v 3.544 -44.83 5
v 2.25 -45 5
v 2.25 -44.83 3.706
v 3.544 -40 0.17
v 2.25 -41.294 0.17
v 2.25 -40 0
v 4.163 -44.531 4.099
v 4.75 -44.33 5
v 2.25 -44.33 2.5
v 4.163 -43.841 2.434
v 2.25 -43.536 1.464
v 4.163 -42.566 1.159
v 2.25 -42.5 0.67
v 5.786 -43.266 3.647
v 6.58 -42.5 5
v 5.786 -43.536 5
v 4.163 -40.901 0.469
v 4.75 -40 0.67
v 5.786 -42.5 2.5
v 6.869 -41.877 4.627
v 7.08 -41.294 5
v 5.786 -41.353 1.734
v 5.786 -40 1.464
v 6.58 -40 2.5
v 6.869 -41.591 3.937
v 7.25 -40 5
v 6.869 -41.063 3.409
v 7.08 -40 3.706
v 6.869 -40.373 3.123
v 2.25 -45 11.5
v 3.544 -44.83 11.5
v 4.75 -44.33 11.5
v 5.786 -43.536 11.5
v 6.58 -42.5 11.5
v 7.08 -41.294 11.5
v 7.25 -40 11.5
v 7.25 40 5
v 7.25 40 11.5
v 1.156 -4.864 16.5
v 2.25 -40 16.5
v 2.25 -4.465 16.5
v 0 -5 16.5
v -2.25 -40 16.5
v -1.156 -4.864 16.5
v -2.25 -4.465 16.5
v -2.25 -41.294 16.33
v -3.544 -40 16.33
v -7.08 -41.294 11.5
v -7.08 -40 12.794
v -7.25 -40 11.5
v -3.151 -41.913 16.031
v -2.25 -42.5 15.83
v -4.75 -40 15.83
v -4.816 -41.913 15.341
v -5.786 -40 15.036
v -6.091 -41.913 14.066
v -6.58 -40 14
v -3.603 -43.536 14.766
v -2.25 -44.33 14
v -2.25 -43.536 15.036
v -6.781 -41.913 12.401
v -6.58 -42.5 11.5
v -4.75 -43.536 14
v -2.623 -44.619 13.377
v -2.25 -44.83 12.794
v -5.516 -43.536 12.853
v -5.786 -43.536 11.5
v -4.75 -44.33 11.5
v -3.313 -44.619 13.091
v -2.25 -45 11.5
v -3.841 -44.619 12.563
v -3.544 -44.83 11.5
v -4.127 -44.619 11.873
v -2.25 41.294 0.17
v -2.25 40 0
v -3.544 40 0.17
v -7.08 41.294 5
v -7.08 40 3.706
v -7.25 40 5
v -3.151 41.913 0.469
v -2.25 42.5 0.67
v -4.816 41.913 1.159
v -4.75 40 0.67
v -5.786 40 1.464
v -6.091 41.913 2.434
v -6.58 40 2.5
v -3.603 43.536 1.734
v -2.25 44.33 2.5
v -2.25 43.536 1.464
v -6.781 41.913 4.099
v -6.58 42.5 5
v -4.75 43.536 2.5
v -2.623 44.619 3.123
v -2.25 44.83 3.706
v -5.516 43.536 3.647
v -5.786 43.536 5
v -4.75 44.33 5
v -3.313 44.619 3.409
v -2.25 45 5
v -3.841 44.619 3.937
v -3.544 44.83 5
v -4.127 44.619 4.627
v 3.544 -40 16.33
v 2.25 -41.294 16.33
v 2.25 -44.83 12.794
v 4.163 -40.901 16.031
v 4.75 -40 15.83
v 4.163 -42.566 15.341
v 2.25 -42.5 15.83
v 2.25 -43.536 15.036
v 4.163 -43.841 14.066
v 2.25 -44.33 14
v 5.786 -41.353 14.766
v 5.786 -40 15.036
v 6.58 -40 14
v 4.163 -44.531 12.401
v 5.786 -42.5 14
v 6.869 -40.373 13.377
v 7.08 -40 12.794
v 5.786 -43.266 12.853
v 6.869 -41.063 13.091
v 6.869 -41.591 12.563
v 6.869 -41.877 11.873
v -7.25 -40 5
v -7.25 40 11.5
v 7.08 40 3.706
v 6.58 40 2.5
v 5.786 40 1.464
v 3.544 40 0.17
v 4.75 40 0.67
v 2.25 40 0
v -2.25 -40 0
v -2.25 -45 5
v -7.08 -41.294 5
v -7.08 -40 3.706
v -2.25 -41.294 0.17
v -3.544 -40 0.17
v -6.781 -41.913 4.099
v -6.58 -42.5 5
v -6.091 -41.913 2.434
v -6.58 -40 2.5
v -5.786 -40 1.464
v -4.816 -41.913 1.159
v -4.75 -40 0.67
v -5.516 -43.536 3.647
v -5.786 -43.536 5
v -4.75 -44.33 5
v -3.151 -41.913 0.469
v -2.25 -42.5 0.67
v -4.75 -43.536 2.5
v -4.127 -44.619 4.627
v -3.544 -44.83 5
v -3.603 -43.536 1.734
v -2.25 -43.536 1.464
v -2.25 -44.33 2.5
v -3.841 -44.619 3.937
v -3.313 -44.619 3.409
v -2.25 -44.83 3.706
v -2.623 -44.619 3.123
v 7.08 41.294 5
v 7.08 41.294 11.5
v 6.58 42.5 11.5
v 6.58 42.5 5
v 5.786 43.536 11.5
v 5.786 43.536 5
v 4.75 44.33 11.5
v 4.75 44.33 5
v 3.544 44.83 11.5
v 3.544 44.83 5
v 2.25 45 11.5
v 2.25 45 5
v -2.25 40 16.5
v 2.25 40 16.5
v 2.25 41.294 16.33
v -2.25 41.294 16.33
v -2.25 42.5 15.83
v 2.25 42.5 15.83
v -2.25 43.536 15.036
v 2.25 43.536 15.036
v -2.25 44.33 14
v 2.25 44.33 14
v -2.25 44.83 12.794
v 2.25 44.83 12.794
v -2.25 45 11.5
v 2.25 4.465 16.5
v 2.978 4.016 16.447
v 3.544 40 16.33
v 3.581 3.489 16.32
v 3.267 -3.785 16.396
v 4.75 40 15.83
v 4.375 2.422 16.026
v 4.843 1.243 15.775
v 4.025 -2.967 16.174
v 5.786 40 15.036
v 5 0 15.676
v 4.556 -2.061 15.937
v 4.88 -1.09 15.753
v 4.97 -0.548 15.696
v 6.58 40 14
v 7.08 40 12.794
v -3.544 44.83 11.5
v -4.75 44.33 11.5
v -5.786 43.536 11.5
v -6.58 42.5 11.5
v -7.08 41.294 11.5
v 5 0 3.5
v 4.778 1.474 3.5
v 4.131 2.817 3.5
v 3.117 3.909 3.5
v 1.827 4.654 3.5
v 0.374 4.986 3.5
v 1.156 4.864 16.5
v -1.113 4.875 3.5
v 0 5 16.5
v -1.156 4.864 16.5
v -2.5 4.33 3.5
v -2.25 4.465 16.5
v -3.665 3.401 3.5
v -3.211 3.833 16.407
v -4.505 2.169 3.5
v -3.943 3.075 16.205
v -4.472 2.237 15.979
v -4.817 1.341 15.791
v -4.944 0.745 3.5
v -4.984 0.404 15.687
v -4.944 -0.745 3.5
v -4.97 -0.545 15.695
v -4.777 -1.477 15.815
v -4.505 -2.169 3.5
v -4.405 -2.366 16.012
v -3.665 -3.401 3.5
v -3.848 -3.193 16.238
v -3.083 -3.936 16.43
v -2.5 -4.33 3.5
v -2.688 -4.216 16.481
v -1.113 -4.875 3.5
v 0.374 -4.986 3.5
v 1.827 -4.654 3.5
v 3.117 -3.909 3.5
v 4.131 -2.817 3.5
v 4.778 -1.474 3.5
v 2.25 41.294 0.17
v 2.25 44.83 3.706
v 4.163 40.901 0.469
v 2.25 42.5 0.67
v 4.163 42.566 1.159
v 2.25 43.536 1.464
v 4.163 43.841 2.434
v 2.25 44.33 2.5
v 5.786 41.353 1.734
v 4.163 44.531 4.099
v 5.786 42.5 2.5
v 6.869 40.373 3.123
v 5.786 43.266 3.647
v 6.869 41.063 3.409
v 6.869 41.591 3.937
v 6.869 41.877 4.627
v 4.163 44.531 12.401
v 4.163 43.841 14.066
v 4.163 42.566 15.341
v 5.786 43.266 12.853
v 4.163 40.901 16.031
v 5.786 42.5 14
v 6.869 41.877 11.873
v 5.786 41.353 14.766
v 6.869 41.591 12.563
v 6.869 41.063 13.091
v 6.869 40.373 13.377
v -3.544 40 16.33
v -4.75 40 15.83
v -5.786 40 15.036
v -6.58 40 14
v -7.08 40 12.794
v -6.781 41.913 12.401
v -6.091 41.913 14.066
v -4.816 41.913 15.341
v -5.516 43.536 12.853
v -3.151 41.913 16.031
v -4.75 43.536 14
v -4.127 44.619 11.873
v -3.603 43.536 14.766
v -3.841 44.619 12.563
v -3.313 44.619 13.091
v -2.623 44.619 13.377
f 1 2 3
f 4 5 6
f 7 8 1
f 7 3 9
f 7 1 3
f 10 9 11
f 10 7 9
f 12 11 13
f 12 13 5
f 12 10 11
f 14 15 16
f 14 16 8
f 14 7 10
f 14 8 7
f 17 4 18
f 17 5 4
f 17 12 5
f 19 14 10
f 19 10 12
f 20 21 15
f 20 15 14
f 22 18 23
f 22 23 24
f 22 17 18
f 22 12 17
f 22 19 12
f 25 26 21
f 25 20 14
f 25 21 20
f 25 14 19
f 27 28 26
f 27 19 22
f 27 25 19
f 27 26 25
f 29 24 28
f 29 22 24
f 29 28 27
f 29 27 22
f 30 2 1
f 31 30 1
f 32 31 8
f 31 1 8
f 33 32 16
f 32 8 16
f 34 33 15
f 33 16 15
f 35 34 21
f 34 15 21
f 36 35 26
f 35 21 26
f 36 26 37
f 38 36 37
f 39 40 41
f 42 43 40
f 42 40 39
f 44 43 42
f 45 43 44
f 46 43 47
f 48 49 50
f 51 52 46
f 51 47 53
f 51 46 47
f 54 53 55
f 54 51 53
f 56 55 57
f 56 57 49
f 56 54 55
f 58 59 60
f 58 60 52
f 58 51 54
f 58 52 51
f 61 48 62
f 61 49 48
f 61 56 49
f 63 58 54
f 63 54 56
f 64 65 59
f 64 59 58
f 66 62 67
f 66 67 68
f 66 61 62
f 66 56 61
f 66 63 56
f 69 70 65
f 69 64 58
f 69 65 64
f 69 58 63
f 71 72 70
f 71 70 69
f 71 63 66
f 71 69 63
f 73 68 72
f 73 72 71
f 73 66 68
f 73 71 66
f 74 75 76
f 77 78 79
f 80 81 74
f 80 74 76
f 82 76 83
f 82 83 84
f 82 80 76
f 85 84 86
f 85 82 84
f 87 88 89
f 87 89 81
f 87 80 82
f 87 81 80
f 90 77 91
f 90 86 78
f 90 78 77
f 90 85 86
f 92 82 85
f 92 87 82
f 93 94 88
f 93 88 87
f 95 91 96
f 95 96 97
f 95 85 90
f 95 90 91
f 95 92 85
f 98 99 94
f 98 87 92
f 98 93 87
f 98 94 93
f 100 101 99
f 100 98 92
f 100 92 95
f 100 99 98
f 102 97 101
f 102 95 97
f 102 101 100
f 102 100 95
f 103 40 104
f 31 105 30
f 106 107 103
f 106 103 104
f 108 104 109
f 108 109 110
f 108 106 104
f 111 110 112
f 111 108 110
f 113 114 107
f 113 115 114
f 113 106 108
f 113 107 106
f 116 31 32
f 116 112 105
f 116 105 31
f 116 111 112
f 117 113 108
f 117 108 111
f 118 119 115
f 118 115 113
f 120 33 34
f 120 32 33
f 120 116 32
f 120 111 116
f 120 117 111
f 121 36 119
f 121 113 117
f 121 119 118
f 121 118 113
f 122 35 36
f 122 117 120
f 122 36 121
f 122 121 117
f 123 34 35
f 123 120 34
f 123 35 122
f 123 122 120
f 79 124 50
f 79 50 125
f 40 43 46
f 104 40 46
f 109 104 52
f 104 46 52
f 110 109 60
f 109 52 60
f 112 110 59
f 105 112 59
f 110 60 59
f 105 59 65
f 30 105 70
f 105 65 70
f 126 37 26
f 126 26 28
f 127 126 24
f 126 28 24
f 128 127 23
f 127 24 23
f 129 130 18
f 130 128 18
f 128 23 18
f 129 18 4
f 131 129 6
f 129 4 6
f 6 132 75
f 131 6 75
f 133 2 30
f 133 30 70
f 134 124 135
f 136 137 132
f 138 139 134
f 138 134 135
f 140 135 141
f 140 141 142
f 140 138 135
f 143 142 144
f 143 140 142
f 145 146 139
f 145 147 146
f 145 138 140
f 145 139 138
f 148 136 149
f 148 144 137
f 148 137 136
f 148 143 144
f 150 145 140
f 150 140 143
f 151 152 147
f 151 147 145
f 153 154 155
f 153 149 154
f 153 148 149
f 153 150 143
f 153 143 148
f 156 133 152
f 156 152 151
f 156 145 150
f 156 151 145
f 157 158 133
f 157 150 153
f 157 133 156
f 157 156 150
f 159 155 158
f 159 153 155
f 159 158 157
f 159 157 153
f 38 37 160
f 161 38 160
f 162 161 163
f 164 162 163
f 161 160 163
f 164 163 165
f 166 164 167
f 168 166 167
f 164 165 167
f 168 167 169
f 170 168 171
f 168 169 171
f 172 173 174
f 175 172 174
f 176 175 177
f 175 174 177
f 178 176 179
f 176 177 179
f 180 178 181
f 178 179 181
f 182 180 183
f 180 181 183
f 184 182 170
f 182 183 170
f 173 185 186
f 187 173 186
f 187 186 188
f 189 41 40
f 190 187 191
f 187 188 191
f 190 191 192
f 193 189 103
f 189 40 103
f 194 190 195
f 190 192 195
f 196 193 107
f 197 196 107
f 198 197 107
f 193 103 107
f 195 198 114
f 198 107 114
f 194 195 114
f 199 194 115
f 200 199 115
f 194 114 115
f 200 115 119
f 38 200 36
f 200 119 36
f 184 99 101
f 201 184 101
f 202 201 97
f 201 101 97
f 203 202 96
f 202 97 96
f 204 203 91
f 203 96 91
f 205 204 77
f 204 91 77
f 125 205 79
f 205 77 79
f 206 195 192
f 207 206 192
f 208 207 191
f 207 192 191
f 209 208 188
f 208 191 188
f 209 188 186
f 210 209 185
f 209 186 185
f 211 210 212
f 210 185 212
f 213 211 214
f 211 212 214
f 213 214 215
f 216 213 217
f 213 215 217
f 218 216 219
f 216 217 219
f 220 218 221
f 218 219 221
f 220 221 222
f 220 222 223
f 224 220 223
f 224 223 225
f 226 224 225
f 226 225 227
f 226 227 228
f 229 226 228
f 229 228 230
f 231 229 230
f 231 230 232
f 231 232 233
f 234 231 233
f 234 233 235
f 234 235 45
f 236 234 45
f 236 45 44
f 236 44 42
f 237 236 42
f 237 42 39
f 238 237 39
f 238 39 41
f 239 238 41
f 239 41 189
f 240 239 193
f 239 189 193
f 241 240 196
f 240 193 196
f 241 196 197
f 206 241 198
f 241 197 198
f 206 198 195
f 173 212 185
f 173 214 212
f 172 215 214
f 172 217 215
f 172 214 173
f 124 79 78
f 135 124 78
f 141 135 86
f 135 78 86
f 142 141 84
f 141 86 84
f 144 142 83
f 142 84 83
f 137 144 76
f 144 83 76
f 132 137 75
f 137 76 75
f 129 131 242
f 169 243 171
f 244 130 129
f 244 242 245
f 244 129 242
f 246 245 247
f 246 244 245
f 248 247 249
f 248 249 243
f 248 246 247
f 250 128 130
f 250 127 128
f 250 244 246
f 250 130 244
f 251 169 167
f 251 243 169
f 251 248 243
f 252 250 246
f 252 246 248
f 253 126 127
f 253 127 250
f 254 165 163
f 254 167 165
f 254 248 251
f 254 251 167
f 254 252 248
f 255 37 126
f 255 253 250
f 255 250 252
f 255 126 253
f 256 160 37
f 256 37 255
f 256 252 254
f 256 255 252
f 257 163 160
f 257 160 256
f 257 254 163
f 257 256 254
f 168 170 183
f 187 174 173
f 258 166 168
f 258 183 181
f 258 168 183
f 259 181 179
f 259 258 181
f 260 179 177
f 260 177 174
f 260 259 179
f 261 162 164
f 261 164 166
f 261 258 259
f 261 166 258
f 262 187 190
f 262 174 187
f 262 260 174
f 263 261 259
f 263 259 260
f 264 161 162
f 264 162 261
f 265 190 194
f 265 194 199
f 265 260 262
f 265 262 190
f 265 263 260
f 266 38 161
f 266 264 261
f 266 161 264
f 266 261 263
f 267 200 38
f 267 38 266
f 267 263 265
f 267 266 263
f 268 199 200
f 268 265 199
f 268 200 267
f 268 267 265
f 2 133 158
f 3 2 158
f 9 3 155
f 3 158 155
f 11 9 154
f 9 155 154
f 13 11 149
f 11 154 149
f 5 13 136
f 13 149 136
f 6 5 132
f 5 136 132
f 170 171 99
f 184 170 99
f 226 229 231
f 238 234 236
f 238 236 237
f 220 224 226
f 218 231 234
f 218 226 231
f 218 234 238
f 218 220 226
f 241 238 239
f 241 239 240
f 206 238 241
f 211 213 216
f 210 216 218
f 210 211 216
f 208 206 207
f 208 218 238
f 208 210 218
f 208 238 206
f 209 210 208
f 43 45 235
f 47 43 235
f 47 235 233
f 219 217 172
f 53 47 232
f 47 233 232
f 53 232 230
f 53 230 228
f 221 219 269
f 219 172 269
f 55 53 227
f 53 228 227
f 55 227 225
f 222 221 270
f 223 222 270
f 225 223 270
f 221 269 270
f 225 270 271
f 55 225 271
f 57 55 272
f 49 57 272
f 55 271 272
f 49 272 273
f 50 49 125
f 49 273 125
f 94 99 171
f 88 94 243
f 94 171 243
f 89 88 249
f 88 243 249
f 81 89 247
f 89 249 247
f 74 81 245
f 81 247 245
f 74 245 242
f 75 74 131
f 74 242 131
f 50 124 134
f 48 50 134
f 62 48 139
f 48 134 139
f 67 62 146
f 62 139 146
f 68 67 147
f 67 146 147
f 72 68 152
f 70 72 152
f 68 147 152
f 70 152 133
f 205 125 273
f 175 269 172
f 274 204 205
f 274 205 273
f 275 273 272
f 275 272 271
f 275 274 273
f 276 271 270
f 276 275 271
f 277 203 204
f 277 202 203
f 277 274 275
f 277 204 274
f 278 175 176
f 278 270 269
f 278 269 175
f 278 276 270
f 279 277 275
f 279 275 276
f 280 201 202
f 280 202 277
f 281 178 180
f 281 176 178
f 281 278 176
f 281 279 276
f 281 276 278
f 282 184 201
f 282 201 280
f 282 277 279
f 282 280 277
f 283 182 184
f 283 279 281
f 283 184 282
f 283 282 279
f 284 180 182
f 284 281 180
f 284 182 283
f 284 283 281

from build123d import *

# Parameters (mm, degrees)
SKETCH7_W           = 90
SKETCH7_H           = 14.5
BOSS_EXTRUDE1_DEPTH = 16.5
SKETCH8_R           = 5
CUT_EXTRUDE2_DEPTH  = 13
FILLET1_R           = 5


with BuildPart() as part:
    # Sketch7 → Boss-Extrude1 (new body)
    with BuildSketch(Plane(origin=(0, 0, 0), x_dir=(0, 1, 0), z_dir=(0, 0, 1))):
        Rectangle(SKETCH7_W, SKETCH7_H)
    extrude(amount=BOSS_EXTRUDE1_DEPTH)

    # Sketch8 → Cut-Extrude2 (cut)
    with BuildSketch(Plane(origin=(0, 0, 16.5), x_dir=(0, -1, 0), z_dir=(0, 0, 1))):
        with Locations(Location((0, 0, 0), (0, 0, 90))):
            Circle(SKETCH8_R)
    extrude(amount=-CUT_EXTRUDE2_DEPTH, mode=Mode.SUBTRACT)

    # Fillet1
    # the kernel refuses this fillet: 5 mm, written as the material it takes off along each edge
    with BuildSketch(Plane(origin=(-2.25, -40, 11.5), x_dir=(0, 0, 1), z_dir=(0, -1, 0))) as fillet1_piece_1_section:
        Polygon((0, 0), (FILLET1_R, 0), (FILLET1_R, FILLET1_R), (0, FILLET1_R), align=None)
    fillet1_piece_1 = extrude(amount=FILLET1_R, mode=Mode.PRIVATE)
    fillet1_piece_1 = fillet1_piece_1 - Plane(origin=(-2.25, -40, 11.5), x_dir=(0.7071067811865475, 0, -0.7071067811865475), z_dir=(0, -1, 0)) * Sphere(FILLET1_R, mode=Mode.PRIVATE)
    add(fillet1_piece_1, mode=Mode.SUBTRACT)
    with BuildSketch(Plane(origin=(2.25, -40, 11.5), x_dir=(0, -1, 0), z_dir=(1, 0, 0))) as fillet1_piece_2_section:
        Polygon((0, 0), (FILLET1_R, 0), (FILLET1_R, -FILLET1_R), (0, -FILLET1_R), align=None)
    fillet1_piece_2 = extrude(amount=FILLET1_R, mode=Mode.PRIVATE)
    fillet1_piece_2 = fillet1_piece_2 - Plane(origin=(2.25, -40, 11.5), x_dir=(0, 0.7071067811865475, -0.7071067811865475), z_dir=(1, 0, 0)) * Sphere(FILLET1_R, mode=Mode.PRIVATE)
    add(fillet1_piece_2, mode=Mode.SUBTRACT)
    with BuildSketch(Plane(origin=(2.25, 40, 11.5), x_dir=(0, 1, 0), z_dir=(1, 0, 0))) as fillet1_piece_3_section:
        Polygon((0, 0), (FILLET1_R, 0), (FILLET1_R, FILLET1_R), (0, FILLET1_R), align=None)
    fillet1_piece_3 = extrude(amount=FILLET1_R, mode=Mode.PRIVATE)
    fillet1_piece_3 = fillet1_piece_3 - Plane(origin=(2.25, 40, 11.5), x_dir=(0, -0.7071067811865475, -0.7071067811865475), z_dir=(1, 0, 0)) * Sphere(FILLET1_R, mode=Mode.PRIVATE)
    add(fillet1_piece_3, mode=Mode.SUBTRACT)
    with BuildSketch(Plane(origin=(-2.25, 40, 11.5), x_dir=(0, 0, 1), z_dir=(0, 1, 0))) as fillet1_piece_4_section:
        Polygon((0, 0), (FILLET1_R, 0), (FILLET1_R, -FILLET1_R), (0, -FILLET1_R), align=None)
    fillet1_piece_4 = extrude(amount=FILLET1_R, mode=Mode.PRIVATE)
    fillet1_piece_4 = fillet1_piece_4 - Plane(origin=(-2.25, 40, 11.5), x_dir=(0.7071067811865475, 0, -0.7071067811865475), z_dir=(0, 1, 0)) * Sphere(FILLET1_R, mode=Mode.PRIVATE)
    add(fillet1_piece_4, mode=Mode.SUBTRACT)
    with BuildSketch(Plane(origin=(2.25, -40, 5), x_dir=(0, -1, 0), z_dir=(1, 0, 0))) as fillet1_piece_5_section:
        Polygon((0, 0), (FILLET1_R, 0), (FILLET1_R, FILLET1_R), (0, FILLET1_R), align=None)
    fillet1_piece_5 = extrude(amount=FILLET1_R, mode=Mode.PRIVATE)
    fillet1_piece_5 = fillet1_piece_5 - Plane(origin=(2.25, -40, 5), x_dir=(0, 0.7071067811865475, 0.7071067811865475), z_dir=(1, 0, 0)) * Sphere(FILLET1_R, mode=Mode.PRIVATE)
    add(fillet1_piece_5, mode=Mode.SUBTRACT)
    with BuildSketch(Plane(origin=(2.25, 40, 5), x_dir=(0, 1, 0), z_dir=(1, 0, 0))) as fillet1_piece_6_section:
        Polygon((0, 0), (FILLET1_R, 0), (FILLET1_R, -FILLET1_R), (0, -FILLET1_R), align=None)
    fillet1_piece_6 = extrude(amount=FILLET1_R, mode=Mode.PRIVATE)
    fillet1_piece_6 = fillet1_piece_6 - Plane(origin=(2.25, 40, 5), x_dir=(0, -0.7071067811865475, 0.7071067811865475), z_dir=(1, 0, 0)) * Sphere(FILLET1_R, mode=Mode.PRIVATE)
    add(fillet1_piece_6, mode=Mode.SUBTRACT)
    with BuildSketch(Plane(origin=(-2.25, -40, 5), x_dir=(0, 0, -1), z_dir=(0, -1, 0))) as fillet1_piece_7_section:
        Polygon((0, 0), (FILLET1_R, 0), (FILLET1_R, -FILLET1_R), (0, -FILLET1_R), align=None)
    fillet1_piece_7 = extrude(amount=FILLET1_R, mode=Mode.PRIVATE)
    fillet1_piece_7 = fillet1_piece_7 - Plane(origin=(-2.25, -40, 5), x_dir=(0.7071067811865475, 0, 0.7071067811865475), z_dir=(0, -1, 0)) * Sphere(FILLET1_R, mode=Mode.PRIVATE)
    add(fillet1_piece_7, mode=Mode.SUBTRACT)
    with BuildSketch(Plane(origin=(-2.25, 40, 5), x_dir=(0, 0, -1), z_dir=(0, 1, 0))) as fillet1_piece_8_section:
        Polygon((0, 0), (FILLET1_R, 0), (FILLET1_R, FILLET1_R), (0, FILLET1_R), align=None)
    fillet1_piece_8 = extrude(amount=FILLET1_R, mode=Mode.PRIVATE)
    fillet1_piece_8 = fillet1_piece_8 - Plane(origin=(-2.25, 40, 5), x_dir=(0.7071067811865475, 0, 0.7071067811865475), z_dir=(0, 1, 0)) * Sphere(FILLET1_R, mode=Mode.PRIVATE)
    add(fillet1_piece_8, mode=Mode.SUBTRACT)
    with BuildSketch(Plane(origin=(-2.25, -45, 16.5), x_dir=(0, 0, -1), z_dir=(1, 0, 0)), Plane(origin=(2.25, 45, 16.5), x_dir=(0, 0, -1), z_dir=(-1, 0, 0))) as fillet1_piece_9:
        with BuildLine():
            CenterArc((FILLET1_R, FILLET1_R), FILLET1_R, 180, 90)
            Line((0, FILLET1_R), (0, 0))
            Line((0, 0), (FILLET1_R, 0))
        make_face()
    extrude(amount=4.5, mode=Mode.SUBTRACT)
    with BuildSketch(Plane(origin=(7.25, -40, 16.5), x_dir=(0, 0, -1), z_dir=(0, 1, 0)), Plane(origin=(-7.25, 40, 0), x_dir=(1, 0, 0), z_dir=(0, -1, 0))) as fillet1_piece_10:
        with BuildLine():
            CenterArc((FILLET1_R, FILLET1_R), FILLET1_R, 180, 90)
            Line((0, FILLET1_R), (0, 0))
            Line((0, 0), (FILLET1_R, 0))
        make_face()
    extrude(amount=80, mode=Mode.SUBTRACT)
    with BuildSketch(Plane(origin=(7.25, -40, 0), x_dir=(0, 0, 1), z_dir=(0, 1, 0)), Plane(origin=(-7.25, 40, 16.5), x_dir=(1, 0, 0), z_dir=(0, -1, 0))) as fillet1_piece_11:
        with BuildLine():
            CenterArc((FILLET1_R, -FILLET1_R), FILLET1_R, 90, 90)
            Line((0, -FILLET1_R), (0, 0))
            Line((0, 0), (FILLET1_R, 0))
        make_face()
    extrude(amount=80, mode=Mode.SUBTRACT)
    with BuildSketch(Plane(origin=(-2.25, -45, 0), x_dir=(0, 0, 1), z_dir=(1, 0, 0)), Plane(origin=(2.25, 45, 0), x_dir=(0, 0, 1), z_dir=(-1, 0, 0))) as fillet1_piece_12:
        with BuildLine():
            CenterArc((FILLET1_R, -FILLET1_R), FILLET1_R, 90, 90)
            Line((0, -FILLET1_R), (0, 0))
            Line((0, 0), (FILLET1_R, 0))
        make_face()
    extrude(amount=4.5, mode=Mode.SUBTRACT)
    with BuildSketch(Plane(origin=(7.25, 45, 5), x_dir=(0, -1, 0), z_dir=(0, 0, 1)), Plane(origin=(-7.25, 45, 5), x_dir=(1, 0, 0), z_dir=(0, 0, 1))) as fillet1_piece_13:
        with BuildLine():
            CenterArc((FILLET1_R, -FILLET1_R), FILLET1_R, 90, 90)
            Line((0, -FILLET1_R), (0, 0))
            Line((0, 0), (FILLET1_R, 0))
        make_face()
    extrude(amount=6.5, mode=Mode.SUBTRACT)
    with BuildSketch(Plane(origin=(7.25, -45, 5), x_dir=(0, 1, 0), z_dir=(0, 0, 1)), Plane(origin=(-7.25, -45, 5), x_dir=(1, 0, 0), z_dir=(0, 0, 1))) as fillet1_piece_14:
        with BuildLine():
            CenterArc((FILLET1_R, FILLET1_R), FILLET1_R, 180, 90)
            Line((0, FILLET1_R), (0, 0))
            Line((0, 0), (FILLET1_R, 0))
        make_face()
    extrude(amount=6.5, mode=Mode.SUBTRACT)


solid = part.part
